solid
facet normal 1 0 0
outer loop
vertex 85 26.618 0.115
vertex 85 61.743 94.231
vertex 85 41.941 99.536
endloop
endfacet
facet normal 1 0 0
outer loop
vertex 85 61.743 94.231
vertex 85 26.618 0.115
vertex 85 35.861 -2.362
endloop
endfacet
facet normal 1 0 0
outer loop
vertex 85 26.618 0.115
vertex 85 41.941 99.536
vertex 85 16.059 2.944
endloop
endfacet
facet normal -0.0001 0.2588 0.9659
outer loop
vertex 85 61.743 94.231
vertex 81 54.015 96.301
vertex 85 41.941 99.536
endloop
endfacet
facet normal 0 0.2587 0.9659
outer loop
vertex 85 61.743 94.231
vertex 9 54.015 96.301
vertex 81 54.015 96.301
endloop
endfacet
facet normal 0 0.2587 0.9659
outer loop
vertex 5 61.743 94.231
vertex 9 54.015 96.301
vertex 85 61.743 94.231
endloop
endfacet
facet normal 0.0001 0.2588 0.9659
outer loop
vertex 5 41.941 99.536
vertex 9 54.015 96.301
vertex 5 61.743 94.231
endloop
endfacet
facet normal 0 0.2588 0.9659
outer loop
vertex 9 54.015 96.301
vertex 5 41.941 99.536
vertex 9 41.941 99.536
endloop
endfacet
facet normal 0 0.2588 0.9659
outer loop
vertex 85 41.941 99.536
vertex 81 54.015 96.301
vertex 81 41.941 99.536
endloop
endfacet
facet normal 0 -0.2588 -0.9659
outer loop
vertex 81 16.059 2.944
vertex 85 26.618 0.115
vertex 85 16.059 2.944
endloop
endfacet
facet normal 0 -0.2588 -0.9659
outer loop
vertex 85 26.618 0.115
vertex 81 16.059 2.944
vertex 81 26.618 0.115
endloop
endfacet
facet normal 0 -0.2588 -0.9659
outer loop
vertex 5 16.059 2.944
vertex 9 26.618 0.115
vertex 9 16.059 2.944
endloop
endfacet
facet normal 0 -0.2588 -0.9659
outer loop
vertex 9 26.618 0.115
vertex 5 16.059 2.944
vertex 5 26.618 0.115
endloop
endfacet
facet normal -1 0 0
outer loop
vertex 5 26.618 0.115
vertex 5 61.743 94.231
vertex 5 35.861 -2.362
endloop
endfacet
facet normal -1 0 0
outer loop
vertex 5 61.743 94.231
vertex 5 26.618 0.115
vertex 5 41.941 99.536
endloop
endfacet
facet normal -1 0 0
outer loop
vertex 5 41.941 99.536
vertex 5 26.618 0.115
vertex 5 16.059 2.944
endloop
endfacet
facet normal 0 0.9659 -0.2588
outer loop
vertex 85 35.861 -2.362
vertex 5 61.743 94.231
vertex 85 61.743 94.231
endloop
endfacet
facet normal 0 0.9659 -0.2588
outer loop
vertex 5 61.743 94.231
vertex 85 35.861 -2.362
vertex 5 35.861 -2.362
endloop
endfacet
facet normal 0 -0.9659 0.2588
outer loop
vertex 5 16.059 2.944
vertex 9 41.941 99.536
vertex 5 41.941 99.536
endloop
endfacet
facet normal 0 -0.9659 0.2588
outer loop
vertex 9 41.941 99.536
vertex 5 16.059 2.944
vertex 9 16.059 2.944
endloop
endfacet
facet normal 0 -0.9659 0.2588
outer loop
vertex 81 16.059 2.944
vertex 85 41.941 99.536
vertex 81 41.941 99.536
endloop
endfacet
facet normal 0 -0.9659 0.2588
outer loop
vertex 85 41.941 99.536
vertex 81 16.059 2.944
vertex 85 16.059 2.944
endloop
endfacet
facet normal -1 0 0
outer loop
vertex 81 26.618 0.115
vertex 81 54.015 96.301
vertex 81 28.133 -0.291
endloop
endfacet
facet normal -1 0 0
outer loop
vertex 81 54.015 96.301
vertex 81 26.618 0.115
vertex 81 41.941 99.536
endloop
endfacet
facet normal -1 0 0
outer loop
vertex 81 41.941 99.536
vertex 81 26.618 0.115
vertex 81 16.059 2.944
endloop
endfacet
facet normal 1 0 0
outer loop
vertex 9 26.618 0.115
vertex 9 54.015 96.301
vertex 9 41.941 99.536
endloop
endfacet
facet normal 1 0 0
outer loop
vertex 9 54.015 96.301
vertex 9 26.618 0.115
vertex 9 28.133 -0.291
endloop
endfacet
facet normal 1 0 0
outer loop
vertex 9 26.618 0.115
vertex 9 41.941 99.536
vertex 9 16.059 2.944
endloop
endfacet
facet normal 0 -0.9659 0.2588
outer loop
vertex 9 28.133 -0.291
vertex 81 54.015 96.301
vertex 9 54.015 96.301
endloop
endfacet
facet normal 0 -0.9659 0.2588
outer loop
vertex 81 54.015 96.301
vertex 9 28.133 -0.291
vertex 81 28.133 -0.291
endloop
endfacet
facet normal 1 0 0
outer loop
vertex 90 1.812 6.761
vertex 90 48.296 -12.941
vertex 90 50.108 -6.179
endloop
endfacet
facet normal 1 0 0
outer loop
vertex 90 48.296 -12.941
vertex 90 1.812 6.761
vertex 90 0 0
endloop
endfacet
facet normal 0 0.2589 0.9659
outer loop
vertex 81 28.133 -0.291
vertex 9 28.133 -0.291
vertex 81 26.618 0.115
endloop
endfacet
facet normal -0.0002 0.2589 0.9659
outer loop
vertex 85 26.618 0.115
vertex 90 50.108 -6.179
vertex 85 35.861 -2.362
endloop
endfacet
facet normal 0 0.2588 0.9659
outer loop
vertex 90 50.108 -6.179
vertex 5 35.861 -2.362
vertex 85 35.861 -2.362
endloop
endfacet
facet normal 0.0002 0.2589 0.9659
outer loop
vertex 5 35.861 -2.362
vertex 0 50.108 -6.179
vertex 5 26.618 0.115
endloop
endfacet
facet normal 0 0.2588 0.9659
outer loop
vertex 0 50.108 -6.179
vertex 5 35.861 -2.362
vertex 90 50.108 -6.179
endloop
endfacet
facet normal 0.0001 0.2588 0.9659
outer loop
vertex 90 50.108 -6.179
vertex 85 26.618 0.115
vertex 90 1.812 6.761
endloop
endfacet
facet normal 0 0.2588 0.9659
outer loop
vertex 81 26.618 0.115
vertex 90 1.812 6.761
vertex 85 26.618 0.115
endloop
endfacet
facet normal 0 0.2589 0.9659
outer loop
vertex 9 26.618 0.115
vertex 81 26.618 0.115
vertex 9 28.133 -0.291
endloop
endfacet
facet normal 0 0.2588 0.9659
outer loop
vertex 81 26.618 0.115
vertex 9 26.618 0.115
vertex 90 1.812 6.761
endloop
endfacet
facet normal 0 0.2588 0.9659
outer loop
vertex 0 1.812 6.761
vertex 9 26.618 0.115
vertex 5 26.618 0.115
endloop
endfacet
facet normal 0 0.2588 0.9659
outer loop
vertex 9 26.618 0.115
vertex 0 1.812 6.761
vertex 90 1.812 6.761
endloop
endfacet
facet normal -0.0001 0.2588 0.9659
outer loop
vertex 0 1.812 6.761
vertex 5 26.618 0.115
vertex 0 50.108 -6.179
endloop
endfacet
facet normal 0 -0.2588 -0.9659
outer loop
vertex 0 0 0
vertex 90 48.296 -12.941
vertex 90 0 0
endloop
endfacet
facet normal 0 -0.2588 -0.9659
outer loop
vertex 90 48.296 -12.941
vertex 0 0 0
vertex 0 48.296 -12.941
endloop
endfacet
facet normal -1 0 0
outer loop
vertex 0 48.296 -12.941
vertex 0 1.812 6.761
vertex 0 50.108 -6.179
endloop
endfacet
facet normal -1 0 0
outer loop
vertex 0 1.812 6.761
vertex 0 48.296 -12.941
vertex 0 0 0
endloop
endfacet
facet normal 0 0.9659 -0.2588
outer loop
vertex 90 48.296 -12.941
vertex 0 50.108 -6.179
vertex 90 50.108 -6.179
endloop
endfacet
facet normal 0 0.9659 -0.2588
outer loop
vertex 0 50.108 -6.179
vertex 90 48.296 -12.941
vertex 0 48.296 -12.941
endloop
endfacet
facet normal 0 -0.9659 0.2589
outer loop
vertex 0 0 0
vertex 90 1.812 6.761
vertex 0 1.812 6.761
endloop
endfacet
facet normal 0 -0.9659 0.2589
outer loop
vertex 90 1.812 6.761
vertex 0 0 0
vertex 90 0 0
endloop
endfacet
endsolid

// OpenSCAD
phoneWidth = 72;
phoneThickness = 12.5;
phoneHeight = 100;
lampBaseThickness = 3;
lampBaseRadius = 30;


dockBaseHeight = 7;
dockBaseWidth = 90;
dockBaseLength = 50;
dockWallThickness = 4;
dockAngle = 15;
dockWidth = phoneWidth + dockWallThickness*2;
dockLength = phoneThickness + dockWallThickness * 2;
dockHeight = phoneHeight + dockWallThickness*2;
dockViewportHeight = 5;

LampDock();


module dock(){
	difference(){
		translate([(dockBaseWidth - dockWidth) / 2, dockBaseLength / 2 - dockLength / 2, dockBaseHeight])cube([dockWidth, dockLength, phoneHeight]);
		translate([(dockBaseWidth - dockWidth) / 2 + dockWallThickness, dockBaseLength / 2 - dockLength / 2, dockBaseHeight]) cube([phoneWidth, phoneThickness, dockHeight]);
}
}

module dockBase(){
cube([dockBaseWidth, dockBaseLength, dockBaseHeight]);

}

module lampBase(){
	cylinder(lampBaseThickness, lampBaseRadius, lampBaseRadius);
}


module LampDock(){
	rotate([-dockAngle, , ]) dockBase();
	rotate([-dockAngle, , ]) dock();
}
